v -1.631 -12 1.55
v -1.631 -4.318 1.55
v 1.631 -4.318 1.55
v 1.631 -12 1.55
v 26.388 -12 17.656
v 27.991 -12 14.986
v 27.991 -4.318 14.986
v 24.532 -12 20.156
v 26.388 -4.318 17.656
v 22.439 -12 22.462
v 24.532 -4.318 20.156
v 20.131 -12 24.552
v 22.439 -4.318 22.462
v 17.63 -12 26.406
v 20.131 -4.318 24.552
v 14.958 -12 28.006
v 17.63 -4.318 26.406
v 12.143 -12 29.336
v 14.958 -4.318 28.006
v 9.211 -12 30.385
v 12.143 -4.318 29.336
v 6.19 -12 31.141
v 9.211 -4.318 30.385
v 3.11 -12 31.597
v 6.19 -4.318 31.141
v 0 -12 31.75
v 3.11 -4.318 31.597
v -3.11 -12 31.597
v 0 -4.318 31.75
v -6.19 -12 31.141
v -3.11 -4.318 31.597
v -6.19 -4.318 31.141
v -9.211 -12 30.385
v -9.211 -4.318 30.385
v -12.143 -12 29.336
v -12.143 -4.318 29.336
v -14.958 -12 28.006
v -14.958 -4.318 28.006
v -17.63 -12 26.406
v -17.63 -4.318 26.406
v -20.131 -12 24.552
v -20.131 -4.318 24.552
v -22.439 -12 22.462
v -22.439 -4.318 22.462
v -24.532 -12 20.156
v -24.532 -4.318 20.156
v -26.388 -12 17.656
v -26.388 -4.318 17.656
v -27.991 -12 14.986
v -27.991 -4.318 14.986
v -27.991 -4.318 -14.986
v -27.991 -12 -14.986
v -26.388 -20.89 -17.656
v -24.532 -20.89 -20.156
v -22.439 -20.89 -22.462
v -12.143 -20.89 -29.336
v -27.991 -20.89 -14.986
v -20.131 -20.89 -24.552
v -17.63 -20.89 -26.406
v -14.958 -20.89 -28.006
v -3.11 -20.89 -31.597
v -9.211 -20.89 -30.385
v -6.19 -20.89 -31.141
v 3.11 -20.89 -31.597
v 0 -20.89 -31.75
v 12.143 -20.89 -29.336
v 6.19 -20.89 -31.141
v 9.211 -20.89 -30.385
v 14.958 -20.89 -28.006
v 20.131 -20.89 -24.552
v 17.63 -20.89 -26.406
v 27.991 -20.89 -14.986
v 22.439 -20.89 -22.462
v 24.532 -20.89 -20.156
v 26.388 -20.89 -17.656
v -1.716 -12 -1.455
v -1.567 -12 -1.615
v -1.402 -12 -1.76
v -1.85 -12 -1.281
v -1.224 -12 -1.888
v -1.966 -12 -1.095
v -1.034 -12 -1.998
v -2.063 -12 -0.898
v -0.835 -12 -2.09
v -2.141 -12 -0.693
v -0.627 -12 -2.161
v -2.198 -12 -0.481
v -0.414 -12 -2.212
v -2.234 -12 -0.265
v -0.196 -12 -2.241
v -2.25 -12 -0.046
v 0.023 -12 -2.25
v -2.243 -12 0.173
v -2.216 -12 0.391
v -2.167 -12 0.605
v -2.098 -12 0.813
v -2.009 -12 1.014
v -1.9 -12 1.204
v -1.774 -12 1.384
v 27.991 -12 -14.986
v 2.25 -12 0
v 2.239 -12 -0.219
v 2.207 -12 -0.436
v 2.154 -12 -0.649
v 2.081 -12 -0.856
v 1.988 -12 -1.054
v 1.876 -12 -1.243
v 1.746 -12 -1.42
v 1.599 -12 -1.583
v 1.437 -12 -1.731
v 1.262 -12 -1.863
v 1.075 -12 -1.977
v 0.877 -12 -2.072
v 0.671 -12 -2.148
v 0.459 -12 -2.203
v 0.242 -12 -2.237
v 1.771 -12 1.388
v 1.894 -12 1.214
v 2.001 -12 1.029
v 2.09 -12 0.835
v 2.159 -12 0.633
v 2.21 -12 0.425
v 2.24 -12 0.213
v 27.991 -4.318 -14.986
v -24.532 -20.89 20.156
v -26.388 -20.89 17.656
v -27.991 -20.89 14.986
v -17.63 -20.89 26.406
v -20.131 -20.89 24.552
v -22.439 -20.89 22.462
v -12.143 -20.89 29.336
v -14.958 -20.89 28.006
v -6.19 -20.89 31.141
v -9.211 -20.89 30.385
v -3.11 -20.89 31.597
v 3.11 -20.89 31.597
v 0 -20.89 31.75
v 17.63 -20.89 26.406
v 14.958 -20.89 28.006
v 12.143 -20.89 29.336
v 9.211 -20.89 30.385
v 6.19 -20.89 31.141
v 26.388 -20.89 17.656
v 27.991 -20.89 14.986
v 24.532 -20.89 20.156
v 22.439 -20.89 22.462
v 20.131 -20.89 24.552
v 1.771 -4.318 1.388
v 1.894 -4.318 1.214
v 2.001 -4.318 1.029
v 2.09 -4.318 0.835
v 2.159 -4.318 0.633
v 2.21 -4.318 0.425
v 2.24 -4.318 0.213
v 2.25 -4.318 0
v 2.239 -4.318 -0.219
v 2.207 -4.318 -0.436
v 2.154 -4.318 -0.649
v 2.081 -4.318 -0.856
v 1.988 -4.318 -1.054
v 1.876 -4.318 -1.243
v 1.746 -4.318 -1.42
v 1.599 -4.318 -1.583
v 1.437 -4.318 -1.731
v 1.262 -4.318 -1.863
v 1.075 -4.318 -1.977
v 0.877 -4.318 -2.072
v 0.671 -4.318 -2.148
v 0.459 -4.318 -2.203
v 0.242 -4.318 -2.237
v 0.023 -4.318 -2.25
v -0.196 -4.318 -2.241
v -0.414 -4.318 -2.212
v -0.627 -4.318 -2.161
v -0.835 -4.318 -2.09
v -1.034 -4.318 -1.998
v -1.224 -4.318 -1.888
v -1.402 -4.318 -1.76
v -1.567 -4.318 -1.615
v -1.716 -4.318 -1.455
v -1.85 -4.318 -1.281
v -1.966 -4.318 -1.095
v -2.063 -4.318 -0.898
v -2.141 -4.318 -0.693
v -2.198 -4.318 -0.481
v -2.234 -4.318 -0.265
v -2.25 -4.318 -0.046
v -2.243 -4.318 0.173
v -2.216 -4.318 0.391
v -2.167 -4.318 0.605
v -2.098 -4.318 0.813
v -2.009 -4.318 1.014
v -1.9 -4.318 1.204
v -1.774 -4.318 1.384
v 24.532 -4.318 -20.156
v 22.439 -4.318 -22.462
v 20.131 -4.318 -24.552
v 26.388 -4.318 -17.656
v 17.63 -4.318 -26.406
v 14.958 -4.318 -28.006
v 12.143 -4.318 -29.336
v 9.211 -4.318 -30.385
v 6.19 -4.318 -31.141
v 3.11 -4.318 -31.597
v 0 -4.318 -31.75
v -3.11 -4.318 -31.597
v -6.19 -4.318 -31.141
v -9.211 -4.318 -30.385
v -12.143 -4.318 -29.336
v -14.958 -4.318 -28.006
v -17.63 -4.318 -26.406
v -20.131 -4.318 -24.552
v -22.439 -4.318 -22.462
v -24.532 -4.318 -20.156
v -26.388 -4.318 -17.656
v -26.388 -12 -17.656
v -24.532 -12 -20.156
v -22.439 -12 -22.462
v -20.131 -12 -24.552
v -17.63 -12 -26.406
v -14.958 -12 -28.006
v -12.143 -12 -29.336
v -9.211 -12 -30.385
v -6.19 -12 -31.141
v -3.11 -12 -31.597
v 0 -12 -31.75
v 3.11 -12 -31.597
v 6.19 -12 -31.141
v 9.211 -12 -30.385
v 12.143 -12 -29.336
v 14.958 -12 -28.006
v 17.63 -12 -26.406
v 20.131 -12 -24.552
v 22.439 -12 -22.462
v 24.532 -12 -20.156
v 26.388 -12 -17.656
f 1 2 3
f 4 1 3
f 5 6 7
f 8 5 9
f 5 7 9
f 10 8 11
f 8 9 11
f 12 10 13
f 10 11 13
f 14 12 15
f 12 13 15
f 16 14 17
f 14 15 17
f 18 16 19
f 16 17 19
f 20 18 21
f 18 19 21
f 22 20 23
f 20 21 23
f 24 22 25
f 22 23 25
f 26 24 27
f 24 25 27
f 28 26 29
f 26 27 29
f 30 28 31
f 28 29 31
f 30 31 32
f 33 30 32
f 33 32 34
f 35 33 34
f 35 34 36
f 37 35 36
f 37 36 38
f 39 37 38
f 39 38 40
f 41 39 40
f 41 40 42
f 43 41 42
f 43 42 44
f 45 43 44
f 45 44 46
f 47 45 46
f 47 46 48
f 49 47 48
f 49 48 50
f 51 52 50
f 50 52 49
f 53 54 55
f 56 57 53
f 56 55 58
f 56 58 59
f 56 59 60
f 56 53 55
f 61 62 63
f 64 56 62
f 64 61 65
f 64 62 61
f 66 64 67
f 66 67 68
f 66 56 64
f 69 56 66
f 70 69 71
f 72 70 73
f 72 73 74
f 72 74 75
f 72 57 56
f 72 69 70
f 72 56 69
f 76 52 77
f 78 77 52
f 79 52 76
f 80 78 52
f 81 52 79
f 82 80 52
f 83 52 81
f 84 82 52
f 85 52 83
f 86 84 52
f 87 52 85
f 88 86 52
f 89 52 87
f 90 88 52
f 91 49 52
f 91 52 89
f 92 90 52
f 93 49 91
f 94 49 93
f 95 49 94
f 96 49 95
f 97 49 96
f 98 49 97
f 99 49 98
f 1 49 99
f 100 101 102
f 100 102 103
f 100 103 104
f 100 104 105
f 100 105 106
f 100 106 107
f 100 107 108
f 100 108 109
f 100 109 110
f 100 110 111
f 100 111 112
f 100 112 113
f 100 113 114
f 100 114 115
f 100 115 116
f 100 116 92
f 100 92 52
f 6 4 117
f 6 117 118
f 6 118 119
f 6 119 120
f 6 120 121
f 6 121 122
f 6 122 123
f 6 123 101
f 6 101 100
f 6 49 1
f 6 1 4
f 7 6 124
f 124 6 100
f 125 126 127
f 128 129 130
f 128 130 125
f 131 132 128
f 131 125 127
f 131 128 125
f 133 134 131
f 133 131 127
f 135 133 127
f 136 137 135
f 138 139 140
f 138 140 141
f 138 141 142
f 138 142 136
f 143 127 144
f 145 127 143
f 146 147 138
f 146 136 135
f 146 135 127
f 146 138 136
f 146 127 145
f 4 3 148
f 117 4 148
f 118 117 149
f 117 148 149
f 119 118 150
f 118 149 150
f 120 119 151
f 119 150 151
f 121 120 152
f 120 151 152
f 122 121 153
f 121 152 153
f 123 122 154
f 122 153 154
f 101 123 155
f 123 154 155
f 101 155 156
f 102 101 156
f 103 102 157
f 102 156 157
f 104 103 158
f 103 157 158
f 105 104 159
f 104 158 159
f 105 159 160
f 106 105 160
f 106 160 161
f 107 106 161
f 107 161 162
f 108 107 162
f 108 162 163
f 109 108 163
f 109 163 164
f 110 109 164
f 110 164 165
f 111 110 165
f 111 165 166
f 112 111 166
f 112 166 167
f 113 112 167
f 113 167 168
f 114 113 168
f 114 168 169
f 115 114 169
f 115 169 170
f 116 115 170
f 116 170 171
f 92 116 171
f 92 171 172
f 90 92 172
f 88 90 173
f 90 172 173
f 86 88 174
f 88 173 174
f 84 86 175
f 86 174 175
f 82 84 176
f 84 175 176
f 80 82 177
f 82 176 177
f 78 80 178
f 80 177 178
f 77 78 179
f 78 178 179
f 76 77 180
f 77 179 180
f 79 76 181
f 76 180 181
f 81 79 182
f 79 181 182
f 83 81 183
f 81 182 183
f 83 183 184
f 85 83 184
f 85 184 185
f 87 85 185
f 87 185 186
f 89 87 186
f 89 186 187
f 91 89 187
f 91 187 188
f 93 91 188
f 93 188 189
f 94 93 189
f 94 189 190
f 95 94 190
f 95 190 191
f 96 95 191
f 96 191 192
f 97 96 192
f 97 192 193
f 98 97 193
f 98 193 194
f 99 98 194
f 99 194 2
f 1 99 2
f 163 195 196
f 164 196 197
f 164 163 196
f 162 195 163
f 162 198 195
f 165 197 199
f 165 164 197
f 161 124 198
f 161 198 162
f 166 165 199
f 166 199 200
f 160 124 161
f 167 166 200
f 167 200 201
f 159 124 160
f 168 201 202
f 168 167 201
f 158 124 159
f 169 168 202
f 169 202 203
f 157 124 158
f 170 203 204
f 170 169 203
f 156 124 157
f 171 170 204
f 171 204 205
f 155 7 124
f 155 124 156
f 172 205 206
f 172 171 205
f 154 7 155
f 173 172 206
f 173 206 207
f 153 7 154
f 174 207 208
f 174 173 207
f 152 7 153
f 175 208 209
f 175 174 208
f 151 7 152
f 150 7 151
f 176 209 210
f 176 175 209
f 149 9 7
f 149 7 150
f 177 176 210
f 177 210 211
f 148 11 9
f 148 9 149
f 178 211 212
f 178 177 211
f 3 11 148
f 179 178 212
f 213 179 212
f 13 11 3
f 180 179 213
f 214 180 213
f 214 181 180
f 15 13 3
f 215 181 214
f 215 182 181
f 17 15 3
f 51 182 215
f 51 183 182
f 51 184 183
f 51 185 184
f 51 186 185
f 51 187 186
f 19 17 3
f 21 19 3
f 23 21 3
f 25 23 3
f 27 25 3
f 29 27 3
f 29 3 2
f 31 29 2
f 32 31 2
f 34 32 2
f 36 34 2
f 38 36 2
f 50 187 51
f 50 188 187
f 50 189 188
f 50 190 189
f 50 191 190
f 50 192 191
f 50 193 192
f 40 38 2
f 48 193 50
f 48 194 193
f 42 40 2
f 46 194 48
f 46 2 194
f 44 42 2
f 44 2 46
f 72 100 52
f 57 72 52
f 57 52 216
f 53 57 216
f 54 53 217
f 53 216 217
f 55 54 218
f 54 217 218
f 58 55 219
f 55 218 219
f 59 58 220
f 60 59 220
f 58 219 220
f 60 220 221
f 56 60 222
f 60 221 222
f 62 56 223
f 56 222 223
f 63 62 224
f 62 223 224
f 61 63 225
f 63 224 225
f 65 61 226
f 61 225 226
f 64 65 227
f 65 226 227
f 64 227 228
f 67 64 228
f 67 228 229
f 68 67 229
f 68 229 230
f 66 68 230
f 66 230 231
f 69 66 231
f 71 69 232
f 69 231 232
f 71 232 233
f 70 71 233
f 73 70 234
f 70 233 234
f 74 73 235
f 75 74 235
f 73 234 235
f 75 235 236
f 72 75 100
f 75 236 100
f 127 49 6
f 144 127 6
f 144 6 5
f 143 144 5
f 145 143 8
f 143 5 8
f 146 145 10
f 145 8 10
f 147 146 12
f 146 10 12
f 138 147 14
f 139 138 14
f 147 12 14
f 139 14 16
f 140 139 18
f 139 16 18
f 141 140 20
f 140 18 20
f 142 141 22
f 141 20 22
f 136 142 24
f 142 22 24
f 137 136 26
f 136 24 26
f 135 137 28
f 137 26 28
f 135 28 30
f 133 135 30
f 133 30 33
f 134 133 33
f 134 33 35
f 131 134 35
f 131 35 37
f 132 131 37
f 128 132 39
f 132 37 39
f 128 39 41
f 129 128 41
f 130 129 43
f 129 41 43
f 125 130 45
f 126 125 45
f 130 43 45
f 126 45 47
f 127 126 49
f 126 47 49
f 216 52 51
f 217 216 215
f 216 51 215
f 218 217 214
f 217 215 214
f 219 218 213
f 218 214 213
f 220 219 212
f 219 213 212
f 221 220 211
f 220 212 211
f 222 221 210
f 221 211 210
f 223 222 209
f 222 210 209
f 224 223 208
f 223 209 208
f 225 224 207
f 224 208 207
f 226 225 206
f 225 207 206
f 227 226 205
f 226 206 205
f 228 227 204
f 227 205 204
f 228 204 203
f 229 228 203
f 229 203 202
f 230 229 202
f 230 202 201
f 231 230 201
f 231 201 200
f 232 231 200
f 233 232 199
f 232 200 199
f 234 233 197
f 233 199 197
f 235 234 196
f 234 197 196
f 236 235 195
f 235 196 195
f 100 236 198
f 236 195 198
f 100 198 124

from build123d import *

# Parameters (mm, degrees)
F0_R     = 31.75
F0_R_2   = 2.25
F1_DEPTH = 4
F2_R     = 31.75
F3_DEPTH = 8
F5_DEPTH = 8.89
F7_DEPTH = 20.891
F8_R     = 39.6924295133
F9_DEPTH = 4.318


with BuildPart() as f1:
    # F0 (on Front) → F1 (new body)
    with BuildSketch(Plane.XZ):
        Circle(F0_R)
        Circle(F0_R_2, mode=Mode.SUBTRACT)
    extrude(amount=F1_DEPTH)

    # F2 (on face) → F3 (join)
    with BuildSketch(Plane.XZ.offset(4)):
        Circle(F2_R)
        with BuildLine():
            ThreePointArc((2.25, 0), (-0.8345241318, -2.0895141716), (-1.630950643, 1.55))
            ThreePointArc((-1.630950643, 1.55), (0, 2.25), (1.630950643, 1.55))
            ThreePointArc((1.630950643, 1.55), (2.0895141716, 0.8345241318), (2.25, 0))
        make_face(mode=Mode.SUBTRACT)
        with BuildLine():
            ThreePointArc((1.630950643, 1.55), (0, 2.25), (-1.630950643, 1.55))
            Line((-1.630950643, 1.55), (1.630950643, 1.55))
        make_face()
    extrude(amount=F3_DEPTH)

    # F4 (on face) → F5 (join)
    with BuildSketch(Plane.XZ.offset(12)):
        with BuildLine():
            ThreePointArc((27.990753902, 14.986), (0, 31.75), (-27.990753902, 14.986))
            Line((-27.990753902, 14.986), (27.990753902, 14.986))
        make_face()
        with BuildLine():
            Line((27.990753902, -14.986), (-27.990753902, -14.986))
            ThreePointArc((-27.990753902, -14.986), (0, -31.75), (27.990753902, -14.986))
        make_face()
    extrude(amount=F5_DEPTH)

    # F6 (on face) → F7 (cut, through all)
    with BuildSketch(Plane.XZ.offset(20.89)):
        with BuildLine():
            Line((-27.990753902, -14.986), (-27.990753902, 14.986))
            ThreePointArc((-27.990753902, 14.986), (-31.75, 0), (-27.990753902, -14.986))
        make_face()
        with BuildLine():
            ThreePointArc((27.990753902, -14.986), (30.795851477, -7.7251557788), (31.75, 0))
            ThreePointArc((31.75, 0), (30.795851477, 7.7251557788), (27.990753902, 14.986))
            Line((27.990753902, 14.986), (27.990753902, -14.986))
        make_face()
    extrude(amount=-F7_DEPTH, mode=Mode.SUBTRACT)

    # F8 (on face) → F9 (cut)
    with BuildSketch(Plane(origin=(0, 0, 0), x_dir=(-1, 0, 0), z_dir=(0, 1, 0))):
        Circle(F8_R)
    extrude(amount=-F9_DEPTH, mode=Mode.SUBTRACT)


solid = f1.part
